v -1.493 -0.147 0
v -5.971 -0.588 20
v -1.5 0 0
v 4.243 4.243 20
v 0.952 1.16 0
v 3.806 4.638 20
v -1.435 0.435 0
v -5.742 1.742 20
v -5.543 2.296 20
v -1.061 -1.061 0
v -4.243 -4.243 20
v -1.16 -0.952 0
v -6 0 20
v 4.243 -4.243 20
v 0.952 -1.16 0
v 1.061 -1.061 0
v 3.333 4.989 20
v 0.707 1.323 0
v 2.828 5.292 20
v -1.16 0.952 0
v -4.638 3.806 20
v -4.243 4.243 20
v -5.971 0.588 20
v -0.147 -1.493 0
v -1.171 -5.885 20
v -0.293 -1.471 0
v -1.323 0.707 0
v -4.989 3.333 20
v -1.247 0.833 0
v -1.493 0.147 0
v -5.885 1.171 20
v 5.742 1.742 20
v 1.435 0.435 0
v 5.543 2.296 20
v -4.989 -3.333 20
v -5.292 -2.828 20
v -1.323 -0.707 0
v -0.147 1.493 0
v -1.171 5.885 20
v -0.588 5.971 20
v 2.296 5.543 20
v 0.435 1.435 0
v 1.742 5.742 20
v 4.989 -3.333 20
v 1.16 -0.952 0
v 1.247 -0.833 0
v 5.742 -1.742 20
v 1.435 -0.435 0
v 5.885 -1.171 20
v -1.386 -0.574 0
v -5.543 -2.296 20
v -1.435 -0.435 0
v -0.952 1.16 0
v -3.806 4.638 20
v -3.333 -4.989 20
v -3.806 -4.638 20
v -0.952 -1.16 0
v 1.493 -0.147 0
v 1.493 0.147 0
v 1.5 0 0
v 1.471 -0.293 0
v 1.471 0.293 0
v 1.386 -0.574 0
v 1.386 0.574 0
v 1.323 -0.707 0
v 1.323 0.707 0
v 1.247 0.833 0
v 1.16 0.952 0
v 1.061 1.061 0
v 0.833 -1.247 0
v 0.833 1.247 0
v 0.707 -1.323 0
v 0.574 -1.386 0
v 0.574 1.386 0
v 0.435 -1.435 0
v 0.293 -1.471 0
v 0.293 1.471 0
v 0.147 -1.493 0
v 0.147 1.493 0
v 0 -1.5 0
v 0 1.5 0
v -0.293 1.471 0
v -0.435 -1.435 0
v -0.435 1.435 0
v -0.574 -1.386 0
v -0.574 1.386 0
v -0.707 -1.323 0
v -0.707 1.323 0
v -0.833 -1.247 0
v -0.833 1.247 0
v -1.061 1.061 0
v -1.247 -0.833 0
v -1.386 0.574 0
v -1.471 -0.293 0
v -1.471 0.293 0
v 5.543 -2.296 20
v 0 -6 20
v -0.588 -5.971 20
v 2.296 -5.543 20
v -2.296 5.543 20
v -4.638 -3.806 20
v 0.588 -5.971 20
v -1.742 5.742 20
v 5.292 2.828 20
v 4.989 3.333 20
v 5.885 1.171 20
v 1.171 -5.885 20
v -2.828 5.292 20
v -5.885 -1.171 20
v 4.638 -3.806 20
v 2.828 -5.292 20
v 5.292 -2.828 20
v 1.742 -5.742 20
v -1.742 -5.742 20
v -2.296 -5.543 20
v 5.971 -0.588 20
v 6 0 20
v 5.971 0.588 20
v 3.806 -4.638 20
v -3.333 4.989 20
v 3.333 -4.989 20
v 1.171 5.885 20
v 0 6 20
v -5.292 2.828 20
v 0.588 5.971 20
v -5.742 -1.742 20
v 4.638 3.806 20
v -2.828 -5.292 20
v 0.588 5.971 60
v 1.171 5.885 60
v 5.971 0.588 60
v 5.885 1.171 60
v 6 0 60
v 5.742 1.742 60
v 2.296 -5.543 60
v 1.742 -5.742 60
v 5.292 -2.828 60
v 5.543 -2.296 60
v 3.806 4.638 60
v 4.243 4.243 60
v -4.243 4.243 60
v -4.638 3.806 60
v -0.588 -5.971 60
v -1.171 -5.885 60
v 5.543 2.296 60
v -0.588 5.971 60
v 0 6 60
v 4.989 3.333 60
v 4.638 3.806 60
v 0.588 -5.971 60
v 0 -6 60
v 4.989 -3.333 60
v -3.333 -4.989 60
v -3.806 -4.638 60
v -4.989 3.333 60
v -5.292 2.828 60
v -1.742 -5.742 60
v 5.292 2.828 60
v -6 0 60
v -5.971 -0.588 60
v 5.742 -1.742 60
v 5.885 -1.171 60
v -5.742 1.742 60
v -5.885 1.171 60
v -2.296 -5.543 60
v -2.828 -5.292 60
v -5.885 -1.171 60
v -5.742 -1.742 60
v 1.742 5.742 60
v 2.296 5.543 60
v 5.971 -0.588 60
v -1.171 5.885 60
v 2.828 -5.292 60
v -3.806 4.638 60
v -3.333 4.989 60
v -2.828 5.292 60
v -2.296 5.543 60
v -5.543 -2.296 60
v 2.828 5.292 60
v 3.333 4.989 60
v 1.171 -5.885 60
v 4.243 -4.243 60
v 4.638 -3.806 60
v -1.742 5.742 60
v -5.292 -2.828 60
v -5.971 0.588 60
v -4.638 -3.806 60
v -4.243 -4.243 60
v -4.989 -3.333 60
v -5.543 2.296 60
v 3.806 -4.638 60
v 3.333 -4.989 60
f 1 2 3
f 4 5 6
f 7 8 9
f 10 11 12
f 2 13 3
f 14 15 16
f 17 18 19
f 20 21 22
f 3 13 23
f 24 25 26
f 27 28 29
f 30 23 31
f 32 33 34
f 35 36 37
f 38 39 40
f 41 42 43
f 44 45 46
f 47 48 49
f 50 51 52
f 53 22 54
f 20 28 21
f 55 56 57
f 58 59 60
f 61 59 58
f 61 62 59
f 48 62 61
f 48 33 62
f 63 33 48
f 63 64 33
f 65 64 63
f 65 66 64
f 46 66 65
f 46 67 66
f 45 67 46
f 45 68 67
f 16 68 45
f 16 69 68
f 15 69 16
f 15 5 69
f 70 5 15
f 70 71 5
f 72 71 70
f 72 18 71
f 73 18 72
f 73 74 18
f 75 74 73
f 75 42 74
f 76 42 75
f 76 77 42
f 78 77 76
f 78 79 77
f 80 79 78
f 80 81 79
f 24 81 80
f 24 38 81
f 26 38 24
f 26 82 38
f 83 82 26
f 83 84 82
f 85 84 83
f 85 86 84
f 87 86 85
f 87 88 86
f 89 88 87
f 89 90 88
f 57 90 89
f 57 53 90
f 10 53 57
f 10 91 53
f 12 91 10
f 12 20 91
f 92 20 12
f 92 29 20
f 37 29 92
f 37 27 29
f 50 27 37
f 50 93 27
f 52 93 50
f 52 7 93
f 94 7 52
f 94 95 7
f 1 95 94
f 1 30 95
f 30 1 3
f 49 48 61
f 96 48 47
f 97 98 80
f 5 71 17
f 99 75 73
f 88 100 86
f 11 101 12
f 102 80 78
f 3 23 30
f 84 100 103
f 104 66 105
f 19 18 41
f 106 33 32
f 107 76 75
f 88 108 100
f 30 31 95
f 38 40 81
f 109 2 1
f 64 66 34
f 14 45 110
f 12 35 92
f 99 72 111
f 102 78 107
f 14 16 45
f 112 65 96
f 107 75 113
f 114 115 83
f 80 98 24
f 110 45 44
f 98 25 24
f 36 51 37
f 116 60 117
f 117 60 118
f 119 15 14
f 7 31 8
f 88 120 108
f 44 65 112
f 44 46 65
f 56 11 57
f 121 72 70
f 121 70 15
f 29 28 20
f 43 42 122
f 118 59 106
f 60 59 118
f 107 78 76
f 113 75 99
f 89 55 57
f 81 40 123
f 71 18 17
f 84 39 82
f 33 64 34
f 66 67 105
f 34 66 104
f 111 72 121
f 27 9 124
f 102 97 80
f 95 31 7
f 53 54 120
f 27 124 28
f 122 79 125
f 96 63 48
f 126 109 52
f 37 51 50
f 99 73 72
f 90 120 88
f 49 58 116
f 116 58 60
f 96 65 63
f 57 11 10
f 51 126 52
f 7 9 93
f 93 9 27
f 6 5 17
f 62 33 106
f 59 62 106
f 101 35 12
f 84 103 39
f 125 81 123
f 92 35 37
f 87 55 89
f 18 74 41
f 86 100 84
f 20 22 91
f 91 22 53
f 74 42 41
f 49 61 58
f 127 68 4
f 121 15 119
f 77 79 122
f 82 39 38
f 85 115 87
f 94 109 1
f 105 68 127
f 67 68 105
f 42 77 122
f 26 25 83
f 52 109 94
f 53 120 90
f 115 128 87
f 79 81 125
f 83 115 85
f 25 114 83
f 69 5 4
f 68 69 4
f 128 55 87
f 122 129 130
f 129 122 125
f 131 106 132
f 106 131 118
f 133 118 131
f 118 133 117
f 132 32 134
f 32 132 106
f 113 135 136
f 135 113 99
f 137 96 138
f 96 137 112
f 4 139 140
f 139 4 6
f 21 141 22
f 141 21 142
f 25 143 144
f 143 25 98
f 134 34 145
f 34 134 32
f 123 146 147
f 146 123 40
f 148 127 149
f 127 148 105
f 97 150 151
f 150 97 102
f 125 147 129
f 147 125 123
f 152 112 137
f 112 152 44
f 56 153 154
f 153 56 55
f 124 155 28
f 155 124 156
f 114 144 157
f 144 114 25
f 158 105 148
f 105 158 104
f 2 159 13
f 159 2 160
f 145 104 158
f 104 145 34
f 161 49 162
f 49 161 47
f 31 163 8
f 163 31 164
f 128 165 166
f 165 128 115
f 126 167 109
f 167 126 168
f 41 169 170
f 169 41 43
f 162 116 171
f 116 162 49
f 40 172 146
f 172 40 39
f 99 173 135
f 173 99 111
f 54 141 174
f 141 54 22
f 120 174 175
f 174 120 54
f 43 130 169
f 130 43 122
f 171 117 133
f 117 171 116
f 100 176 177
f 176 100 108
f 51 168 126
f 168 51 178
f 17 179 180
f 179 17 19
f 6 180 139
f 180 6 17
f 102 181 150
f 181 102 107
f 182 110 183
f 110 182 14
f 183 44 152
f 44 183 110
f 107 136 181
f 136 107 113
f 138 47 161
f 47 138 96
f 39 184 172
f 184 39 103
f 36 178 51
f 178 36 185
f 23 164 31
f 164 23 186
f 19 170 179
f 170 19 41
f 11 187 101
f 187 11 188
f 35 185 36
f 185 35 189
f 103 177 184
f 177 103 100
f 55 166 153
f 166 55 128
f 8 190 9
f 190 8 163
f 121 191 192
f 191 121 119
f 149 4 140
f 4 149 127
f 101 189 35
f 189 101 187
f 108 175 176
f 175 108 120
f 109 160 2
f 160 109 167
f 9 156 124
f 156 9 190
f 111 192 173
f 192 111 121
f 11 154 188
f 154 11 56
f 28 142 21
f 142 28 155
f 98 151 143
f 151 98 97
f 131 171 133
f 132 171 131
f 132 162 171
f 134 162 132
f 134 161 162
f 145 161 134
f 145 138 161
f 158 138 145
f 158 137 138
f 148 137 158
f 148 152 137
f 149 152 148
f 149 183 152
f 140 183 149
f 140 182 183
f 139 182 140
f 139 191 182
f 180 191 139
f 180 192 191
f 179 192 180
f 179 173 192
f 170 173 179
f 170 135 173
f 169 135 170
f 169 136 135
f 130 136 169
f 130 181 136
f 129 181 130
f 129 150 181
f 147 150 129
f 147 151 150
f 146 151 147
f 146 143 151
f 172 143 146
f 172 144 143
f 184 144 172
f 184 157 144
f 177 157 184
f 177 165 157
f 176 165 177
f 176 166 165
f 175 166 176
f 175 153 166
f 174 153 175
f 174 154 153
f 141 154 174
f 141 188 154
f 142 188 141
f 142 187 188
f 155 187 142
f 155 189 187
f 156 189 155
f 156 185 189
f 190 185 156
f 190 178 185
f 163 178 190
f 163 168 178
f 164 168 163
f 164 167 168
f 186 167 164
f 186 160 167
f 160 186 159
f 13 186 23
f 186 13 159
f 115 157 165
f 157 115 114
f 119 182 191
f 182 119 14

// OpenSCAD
// Parametric dibber (dibble stick) for the seed-planting robot.
// Creates a conical hole in soil for seed insertion.
// Issue #77 task: Progettare meccanismo di piantagione.
// Print in PETG or PLA, 100% infill for rigidity.

// Parameters (mm)
dibber_length = 60;       // total length of the dibber shaft
dibber_tip_len = 20;     // length of the conical tip
dibber_base_dia = 12;    // diameter at the base (top)
dibber_tip_dia = 3;      // diameter at the tip (makes ~30 mm hole at full insertion)
mount_hole_dia = 4.2;    // mounting hole for servo horn / M4 bolt

$fn = 64;  // smooth circles

module dibber() {
  // main conical body
  hull() {
    cylinder(h = dibber_tip_len, r1 = dibber_tip_dia / 2, r2 = dibber_base_dia / 2);
    cylinder(h = 0.1, r1 = dibber_tip_dia / 2, r2 = dibber_tip_dia / 2);
  }

  // shaft above the cone
  translate([0, 0, dibber_tip_len])
    cylinder(h = dibber_length - dibber_tip_len, d = dibber_base_dia);

  // mounting hole through the top
  translate([0, 0, dibber_length - 6])
    cylinder(h = 6, d = mount_hole_dia, $fn = 24);
}

dibber();
// Print tip-down for best overhang results.
